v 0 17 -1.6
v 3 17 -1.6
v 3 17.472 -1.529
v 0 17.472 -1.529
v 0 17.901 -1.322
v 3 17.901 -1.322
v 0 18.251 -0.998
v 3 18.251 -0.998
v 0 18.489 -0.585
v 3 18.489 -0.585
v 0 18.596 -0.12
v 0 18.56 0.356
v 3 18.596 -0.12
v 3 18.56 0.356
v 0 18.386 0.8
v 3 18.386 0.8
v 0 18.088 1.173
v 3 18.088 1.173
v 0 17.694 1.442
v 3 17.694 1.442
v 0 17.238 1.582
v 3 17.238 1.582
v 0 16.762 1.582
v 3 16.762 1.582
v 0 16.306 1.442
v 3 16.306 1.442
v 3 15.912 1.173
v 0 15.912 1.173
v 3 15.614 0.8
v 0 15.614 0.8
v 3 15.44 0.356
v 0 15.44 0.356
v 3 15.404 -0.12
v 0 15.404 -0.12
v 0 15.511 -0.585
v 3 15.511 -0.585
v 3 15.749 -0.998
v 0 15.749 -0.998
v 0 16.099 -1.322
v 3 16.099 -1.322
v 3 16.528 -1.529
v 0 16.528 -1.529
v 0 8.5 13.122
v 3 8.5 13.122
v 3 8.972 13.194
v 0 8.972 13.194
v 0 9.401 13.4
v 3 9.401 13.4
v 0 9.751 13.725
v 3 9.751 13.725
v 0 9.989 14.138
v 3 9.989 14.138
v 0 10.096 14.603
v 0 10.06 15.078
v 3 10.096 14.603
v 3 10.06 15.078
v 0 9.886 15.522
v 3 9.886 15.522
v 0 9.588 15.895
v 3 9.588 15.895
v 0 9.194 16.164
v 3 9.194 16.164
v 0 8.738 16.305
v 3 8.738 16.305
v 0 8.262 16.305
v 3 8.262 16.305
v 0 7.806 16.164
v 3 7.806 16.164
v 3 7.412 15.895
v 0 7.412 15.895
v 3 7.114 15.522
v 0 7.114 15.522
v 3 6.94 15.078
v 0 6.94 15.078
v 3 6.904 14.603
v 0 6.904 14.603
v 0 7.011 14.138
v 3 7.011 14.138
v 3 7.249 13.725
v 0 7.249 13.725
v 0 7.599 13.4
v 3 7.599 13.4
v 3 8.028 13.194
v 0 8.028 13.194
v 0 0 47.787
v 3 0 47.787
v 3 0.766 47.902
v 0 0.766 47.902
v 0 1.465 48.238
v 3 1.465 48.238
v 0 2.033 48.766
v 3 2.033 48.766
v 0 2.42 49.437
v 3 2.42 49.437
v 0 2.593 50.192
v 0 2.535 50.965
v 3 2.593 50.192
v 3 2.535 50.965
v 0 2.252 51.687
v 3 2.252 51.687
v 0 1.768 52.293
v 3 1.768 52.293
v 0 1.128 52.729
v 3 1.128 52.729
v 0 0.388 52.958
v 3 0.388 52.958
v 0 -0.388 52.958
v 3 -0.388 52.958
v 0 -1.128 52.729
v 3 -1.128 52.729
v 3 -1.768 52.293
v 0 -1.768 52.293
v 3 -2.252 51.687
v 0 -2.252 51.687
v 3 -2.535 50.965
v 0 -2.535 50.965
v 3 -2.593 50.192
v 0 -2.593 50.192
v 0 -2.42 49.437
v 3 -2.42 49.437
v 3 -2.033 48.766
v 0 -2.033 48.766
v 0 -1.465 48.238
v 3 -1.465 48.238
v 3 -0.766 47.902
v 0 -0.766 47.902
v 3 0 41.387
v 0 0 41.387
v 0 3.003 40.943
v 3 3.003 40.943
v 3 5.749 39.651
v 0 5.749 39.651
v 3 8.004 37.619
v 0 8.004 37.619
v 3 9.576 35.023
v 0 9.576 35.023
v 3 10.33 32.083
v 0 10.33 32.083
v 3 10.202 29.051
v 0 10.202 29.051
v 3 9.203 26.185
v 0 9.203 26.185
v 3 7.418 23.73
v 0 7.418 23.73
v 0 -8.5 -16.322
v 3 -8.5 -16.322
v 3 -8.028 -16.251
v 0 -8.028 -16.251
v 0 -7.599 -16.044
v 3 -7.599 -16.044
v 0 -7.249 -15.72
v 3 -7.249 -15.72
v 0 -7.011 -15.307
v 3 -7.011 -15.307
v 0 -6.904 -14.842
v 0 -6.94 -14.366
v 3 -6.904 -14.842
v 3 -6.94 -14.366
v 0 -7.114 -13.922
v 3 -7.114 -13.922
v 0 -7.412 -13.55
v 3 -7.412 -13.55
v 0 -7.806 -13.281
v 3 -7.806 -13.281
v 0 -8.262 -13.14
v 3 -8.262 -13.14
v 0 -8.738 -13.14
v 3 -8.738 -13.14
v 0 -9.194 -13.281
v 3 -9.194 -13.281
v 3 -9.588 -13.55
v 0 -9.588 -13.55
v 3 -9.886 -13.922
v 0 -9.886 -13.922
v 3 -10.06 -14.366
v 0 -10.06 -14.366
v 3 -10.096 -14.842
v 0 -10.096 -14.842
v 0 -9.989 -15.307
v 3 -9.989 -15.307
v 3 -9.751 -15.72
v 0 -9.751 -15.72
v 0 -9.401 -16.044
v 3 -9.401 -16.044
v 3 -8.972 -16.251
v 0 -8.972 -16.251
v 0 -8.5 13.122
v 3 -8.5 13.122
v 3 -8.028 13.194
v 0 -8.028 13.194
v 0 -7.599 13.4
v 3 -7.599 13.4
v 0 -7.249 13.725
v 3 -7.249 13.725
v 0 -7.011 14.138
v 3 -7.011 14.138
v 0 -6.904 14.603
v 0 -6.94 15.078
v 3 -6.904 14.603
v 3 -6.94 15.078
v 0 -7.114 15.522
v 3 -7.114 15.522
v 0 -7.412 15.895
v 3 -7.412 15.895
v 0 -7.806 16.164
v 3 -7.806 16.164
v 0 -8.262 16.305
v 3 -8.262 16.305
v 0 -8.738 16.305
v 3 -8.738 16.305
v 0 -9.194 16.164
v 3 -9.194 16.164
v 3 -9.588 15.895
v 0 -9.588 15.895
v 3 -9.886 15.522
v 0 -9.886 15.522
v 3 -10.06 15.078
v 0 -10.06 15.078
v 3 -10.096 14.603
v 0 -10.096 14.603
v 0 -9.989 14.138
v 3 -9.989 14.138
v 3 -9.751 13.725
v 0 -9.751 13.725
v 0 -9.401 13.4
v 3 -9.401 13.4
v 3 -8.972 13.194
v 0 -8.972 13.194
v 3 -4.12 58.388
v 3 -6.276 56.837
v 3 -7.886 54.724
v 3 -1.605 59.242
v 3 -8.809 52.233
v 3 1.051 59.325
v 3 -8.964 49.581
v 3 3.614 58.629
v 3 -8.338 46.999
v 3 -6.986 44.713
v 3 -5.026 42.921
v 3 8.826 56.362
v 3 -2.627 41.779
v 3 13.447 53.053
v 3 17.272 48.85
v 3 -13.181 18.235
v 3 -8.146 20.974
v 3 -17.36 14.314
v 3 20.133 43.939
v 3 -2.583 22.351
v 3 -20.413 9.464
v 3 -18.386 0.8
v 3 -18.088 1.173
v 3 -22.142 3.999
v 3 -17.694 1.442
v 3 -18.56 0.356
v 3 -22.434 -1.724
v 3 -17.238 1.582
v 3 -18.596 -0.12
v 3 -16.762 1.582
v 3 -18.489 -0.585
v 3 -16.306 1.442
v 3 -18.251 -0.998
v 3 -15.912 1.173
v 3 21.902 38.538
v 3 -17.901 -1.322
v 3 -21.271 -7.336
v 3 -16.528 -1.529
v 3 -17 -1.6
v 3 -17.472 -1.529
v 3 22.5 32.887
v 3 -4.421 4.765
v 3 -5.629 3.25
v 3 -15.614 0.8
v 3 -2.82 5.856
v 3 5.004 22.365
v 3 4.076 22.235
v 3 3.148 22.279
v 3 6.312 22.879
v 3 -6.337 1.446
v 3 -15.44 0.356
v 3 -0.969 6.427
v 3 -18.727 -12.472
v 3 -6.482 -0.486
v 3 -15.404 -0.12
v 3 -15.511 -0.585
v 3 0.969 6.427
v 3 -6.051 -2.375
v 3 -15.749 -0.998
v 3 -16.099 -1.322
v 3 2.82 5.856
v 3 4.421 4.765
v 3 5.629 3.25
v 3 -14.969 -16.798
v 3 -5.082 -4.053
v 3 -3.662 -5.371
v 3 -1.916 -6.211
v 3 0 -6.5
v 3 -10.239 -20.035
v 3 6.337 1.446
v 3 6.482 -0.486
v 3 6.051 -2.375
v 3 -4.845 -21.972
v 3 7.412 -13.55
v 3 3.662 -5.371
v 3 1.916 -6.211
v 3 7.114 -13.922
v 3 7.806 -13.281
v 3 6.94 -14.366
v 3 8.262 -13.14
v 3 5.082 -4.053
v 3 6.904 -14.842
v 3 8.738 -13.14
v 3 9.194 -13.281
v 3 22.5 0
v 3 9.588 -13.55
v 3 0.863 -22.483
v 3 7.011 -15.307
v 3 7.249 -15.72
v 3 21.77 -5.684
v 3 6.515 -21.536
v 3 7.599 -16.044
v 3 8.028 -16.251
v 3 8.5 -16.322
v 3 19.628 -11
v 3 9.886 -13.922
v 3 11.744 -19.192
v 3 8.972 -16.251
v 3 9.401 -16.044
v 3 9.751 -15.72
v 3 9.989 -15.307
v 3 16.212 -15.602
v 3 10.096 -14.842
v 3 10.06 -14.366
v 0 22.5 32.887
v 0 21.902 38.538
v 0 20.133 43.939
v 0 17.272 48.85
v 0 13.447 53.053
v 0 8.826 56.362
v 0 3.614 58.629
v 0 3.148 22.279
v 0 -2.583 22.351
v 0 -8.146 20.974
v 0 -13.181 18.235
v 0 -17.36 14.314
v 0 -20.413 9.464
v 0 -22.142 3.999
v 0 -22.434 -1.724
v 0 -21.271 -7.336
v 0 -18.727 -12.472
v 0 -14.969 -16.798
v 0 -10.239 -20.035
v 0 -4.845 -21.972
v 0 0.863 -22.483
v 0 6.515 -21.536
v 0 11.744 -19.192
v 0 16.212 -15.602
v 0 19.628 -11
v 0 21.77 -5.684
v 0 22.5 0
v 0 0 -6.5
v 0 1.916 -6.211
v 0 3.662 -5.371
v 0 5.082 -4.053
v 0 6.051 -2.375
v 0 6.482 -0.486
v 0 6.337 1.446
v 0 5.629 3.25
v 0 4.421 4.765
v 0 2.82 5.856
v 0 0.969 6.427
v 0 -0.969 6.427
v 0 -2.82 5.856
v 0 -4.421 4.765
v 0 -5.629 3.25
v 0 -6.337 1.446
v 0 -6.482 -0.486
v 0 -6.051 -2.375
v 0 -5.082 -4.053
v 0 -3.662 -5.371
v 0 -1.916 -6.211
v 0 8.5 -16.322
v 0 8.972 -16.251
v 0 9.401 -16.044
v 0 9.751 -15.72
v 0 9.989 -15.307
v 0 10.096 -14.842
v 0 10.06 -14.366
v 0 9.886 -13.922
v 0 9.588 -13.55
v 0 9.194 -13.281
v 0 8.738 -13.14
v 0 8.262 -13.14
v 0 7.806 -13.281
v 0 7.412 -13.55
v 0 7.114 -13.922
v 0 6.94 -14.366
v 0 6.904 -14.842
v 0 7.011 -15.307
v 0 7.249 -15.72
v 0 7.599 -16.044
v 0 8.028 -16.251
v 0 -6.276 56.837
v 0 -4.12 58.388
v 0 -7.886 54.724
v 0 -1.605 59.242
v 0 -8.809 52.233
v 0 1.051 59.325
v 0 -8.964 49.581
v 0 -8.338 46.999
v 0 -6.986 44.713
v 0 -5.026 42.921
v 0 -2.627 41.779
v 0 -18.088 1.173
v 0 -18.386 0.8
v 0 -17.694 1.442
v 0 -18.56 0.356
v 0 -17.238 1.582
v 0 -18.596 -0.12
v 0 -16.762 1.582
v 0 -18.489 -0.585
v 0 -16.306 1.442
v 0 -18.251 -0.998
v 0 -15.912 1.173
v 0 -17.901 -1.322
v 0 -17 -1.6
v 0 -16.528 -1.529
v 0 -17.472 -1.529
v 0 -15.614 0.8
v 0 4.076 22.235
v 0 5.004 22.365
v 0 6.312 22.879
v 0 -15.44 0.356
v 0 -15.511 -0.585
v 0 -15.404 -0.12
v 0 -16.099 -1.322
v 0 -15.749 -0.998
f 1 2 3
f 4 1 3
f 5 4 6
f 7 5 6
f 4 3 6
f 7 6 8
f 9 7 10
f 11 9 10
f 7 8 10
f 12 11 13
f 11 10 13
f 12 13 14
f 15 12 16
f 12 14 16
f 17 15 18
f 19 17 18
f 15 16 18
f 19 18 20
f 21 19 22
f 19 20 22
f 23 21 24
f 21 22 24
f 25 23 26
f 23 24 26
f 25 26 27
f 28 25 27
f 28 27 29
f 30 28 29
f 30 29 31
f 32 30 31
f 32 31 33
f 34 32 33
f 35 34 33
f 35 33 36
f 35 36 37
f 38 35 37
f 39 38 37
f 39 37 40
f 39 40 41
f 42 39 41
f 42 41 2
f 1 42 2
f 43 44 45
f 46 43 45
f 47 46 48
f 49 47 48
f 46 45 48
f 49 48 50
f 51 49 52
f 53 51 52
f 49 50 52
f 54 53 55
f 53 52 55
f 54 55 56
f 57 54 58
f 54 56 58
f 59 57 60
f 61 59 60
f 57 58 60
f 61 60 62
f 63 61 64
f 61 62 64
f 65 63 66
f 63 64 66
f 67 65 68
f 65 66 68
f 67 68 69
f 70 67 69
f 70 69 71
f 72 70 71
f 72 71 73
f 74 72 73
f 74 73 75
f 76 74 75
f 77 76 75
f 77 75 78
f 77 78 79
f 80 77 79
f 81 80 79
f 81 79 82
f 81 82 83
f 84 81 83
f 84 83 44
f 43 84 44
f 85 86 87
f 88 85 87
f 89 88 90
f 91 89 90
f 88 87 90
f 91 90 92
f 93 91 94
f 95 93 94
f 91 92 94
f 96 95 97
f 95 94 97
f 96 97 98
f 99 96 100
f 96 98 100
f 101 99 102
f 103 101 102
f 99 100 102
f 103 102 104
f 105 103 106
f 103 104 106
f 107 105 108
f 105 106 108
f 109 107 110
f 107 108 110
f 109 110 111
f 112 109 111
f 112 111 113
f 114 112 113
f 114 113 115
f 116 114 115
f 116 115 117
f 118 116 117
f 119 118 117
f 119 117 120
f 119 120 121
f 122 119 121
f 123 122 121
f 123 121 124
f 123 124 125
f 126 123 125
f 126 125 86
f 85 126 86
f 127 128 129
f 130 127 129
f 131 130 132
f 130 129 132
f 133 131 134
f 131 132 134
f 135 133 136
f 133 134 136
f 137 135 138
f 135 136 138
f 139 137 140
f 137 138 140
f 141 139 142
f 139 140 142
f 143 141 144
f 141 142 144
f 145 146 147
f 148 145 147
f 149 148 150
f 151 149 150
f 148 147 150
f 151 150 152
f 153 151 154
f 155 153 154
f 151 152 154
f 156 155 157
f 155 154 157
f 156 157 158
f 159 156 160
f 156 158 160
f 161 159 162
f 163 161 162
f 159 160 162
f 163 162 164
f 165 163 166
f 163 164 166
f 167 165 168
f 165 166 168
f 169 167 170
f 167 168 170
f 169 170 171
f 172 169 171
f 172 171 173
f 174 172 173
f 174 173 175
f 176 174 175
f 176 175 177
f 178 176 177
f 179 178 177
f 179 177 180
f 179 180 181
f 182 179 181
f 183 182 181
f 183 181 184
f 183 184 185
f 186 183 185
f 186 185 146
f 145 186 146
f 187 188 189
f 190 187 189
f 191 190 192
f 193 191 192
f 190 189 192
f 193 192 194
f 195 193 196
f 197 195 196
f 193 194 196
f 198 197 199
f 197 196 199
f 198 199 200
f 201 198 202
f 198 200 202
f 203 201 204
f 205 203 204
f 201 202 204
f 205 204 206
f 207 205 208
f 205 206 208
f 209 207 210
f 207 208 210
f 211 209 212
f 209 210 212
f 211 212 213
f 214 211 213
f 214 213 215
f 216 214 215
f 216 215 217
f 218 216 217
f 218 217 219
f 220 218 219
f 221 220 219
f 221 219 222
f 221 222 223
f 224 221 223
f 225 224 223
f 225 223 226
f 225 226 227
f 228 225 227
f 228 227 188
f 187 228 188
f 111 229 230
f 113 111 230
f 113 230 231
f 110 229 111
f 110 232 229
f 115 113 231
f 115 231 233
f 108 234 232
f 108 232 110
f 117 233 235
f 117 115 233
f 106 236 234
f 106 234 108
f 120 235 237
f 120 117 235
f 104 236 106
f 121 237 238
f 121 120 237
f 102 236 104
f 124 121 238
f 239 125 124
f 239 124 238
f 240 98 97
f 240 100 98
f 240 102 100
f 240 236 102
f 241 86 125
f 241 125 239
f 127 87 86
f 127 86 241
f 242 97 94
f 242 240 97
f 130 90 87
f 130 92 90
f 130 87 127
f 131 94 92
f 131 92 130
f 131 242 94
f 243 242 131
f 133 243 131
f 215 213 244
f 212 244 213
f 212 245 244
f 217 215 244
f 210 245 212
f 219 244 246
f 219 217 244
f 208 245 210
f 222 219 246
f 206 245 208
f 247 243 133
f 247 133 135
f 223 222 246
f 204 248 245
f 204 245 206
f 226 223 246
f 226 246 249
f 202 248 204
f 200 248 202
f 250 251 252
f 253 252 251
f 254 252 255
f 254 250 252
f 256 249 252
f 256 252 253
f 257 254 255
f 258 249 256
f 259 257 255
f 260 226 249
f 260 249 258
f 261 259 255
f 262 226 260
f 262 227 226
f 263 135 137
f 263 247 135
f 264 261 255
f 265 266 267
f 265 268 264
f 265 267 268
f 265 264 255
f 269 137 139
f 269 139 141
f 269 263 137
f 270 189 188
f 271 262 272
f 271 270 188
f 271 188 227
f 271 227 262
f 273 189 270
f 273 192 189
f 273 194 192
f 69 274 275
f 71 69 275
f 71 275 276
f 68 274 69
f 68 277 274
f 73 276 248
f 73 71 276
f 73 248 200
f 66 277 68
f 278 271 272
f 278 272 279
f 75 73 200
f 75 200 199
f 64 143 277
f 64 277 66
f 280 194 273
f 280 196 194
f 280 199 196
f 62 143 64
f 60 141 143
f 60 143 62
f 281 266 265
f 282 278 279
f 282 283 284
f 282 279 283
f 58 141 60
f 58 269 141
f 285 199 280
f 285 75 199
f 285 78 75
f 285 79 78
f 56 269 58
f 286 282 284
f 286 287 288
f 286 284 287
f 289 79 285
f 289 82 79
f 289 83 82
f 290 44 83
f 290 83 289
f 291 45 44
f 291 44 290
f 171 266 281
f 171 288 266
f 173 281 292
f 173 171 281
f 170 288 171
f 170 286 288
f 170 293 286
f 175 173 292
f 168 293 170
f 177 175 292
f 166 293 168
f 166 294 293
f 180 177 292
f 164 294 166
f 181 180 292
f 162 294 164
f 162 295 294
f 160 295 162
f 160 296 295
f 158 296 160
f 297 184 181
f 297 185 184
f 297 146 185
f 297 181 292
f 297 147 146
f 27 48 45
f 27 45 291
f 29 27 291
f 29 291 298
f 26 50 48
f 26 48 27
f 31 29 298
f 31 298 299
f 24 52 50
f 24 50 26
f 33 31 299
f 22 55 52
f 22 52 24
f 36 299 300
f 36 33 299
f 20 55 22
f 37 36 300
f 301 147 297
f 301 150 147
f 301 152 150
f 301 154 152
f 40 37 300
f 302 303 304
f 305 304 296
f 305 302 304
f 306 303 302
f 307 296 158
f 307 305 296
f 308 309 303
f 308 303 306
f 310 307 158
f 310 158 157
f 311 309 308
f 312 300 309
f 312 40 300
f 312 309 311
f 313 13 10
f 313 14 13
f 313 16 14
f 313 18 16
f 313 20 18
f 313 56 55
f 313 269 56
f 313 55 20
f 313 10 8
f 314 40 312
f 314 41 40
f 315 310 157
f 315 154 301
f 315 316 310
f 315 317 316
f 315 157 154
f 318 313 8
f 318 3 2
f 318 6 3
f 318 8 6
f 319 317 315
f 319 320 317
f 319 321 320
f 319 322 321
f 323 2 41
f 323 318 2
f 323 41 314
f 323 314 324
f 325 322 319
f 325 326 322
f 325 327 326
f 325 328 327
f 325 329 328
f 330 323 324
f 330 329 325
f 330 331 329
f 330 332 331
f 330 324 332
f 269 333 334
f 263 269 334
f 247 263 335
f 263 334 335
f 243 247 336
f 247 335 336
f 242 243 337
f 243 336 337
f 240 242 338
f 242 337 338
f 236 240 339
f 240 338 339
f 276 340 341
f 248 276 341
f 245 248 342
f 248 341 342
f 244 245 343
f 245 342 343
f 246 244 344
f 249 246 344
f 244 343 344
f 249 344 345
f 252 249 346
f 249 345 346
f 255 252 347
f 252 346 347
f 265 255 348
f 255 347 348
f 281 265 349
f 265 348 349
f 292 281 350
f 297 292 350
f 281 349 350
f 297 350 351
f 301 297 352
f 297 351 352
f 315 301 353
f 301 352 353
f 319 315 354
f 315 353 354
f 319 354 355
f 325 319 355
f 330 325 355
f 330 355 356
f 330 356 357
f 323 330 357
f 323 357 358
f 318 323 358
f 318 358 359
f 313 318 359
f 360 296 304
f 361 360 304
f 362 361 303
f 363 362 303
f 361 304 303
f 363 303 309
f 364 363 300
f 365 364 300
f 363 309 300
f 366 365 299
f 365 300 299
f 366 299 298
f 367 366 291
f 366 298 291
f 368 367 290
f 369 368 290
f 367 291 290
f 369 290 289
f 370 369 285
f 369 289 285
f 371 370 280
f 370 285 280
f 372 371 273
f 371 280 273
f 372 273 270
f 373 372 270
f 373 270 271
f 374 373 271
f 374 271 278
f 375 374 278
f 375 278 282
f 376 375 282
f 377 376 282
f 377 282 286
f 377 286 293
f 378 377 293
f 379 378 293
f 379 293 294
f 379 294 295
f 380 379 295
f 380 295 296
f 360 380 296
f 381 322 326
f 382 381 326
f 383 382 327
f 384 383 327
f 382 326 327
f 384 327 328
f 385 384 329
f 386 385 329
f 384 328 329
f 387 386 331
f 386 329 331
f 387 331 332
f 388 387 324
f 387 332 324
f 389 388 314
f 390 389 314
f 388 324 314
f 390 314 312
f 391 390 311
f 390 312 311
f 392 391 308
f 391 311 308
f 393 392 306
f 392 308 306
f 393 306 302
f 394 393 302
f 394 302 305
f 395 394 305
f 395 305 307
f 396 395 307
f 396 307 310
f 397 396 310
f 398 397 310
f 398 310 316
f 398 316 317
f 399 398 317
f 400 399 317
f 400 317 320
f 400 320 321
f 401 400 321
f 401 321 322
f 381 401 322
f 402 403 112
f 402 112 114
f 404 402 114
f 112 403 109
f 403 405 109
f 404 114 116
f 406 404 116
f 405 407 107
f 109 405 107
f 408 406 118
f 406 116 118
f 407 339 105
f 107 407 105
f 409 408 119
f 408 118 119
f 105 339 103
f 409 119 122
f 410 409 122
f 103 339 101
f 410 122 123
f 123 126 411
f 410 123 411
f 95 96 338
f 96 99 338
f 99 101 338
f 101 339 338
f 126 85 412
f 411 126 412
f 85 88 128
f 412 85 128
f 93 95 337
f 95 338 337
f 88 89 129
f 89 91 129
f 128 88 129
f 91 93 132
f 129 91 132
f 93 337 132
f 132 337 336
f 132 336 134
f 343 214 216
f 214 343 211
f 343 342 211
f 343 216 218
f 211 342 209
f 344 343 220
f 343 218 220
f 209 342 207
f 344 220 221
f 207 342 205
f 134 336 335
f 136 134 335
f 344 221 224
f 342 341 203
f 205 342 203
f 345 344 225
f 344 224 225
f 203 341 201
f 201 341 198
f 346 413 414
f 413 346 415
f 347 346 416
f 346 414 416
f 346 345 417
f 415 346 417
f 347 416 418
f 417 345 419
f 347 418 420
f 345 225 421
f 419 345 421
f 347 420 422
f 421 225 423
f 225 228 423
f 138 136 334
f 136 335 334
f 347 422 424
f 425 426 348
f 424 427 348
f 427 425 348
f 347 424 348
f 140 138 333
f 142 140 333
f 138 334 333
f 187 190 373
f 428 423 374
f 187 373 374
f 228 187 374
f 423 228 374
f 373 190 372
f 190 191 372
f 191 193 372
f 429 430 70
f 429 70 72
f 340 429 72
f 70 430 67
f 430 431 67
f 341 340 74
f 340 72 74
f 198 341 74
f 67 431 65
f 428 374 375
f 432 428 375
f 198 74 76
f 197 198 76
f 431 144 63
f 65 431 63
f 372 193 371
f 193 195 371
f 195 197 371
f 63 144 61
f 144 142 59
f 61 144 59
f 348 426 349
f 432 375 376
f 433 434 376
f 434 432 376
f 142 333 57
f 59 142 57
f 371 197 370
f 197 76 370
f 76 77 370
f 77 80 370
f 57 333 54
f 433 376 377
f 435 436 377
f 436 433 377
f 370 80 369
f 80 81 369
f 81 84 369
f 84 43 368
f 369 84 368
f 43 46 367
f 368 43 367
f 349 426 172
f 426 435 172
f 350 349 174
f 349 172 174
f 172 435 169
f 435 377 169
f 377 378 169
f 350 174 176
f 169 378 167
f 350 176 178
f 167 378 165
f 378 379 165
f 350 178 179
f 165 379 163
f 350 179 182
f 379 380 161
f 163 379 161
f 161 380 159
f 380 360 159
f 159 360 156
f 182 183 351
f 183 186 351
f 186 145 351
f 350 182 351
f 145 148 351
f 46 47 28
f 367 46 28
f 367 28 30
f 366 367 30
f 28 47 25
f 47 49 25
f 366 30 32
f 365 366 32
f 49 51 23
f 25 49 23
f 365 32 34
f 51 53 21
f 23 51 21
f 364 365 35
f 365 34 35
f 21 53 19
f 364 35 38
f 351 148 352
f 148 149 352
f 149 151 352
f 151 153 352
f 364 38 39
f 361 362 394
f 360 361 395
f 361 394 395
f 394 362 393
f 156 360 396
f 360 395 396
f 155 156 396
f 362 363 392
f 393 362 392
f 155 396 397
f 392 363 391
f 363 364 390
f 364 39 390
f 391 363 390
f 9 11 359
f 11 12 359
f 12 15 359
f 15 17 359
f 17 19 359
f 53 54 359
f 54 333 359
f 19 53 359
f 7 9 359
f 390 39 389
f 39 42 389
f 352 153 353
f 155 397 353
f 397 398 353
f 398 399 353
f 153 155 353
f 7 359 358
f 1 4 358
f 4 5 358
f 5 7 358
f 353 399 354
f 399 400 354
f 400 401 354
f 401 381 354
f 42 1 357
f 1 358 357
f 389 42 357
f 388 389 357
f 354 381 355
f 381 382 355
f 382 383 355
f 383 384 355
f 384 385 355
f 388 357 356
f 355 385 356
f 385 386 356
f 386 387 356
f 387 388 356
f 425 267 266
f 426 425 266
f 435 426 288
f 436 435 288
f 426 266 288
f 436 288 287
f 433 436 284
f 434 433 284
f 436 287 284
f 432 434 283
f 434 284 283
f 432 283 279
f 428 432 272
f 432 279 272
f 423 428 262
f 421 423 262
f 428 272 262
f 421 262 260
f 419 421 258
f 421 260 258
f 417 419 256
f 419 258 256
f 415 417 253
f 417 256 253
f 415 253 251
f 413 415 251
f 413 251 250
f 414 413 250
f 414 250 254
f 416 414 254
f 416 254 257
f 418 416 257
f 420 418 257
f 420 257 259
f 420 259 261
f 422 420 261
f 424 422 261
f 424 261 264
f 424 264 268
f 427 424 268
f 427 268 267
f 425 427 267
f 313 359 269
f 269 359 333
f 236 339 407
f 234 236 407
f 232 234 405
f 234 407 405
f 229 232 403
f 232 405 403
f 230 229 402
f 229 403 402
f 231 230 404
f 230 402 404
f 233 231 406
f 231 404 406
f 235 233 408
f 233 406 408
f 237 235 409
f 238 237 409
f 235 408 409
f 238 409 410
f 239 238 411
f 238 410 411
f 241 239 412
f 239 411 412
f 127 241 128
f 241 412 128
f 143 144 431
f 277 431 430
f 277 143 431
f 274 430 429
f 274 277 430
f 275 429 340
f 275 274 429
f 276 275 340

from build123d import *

# Parameters (mm, degrees)
BOSS_EXTRUDE1_DEPTH = 3
FILLET2_R           = 5
SKETCH2_R           = 6.5
SKETCH2_R_2         = 2.6
SKETCH2_R_3         = 1.6
CUT_EXTRUDE1_DEPTH  = 4.0000001


with BuildPart() as part:
    # Sketch1 → Boss-Extrude1 (new body)
    with BuildSketch(Plane(origin=(0, 0, 0), x_dir=(0, 0, -1), z_dir=(1, 0, 0))):
        with BuildLine():
            ThreePointArc((-41.386624325, 0), (-33.610207892, 10.053296954), (-21.925290889, 5.052882289))
            ThreePointArc((-21.925290889, 5.052882289), (14.009999081, -17.60596279), (0, 22.5))
            Line((0, 22.5), (-32.886624325, 22.5))
            ThreePointArc((-32.886624325, 22.5), (-48.850275915, 17.272163951), (-58.62909831, 3.614086692))
            ThreePointArc((-58.62909831, 3.614086692), (-52.232936073, -8.808582913), (-41.386624325, 0))
        make_face()
    extrude(amount=BOSS_EXTRUDE1_DEPTH)

    # Fillet2
    fillet2_edges = [part.edges().sort_by_distance(p)[0] for p in [
        (1.5, 5.052882289, 21.925290889),
    ]]
    fillet(fillet2_edges, radius=FILLET2_R)

    # Sketch2 → Cut-Extrude1 (cut, through all)
    with BuildSketch(Plane(origin=(3, 0, 0), x_dir=(0, 0, -1), z_dir=(1, 0, 0))):
        Circle(SKETCH2_R)
        with Locations((-50.386624325, 0)):
            Circle(SKETCH2_R_2)
        with Locations((0, 17)):
            Circle(SKETCH2_R_3)
        with Locations((14.722431864, 8.5)):
            Circle(SKETCH2_R_3)
        with Locations((14.722431864, -8.5)):
            Circle(SKETCH2_R_3)
        with Locations((0, -17)):
            Circle(SKETCH2_R_3)
        with Locations((-14.722431864, -8.5)):
            Circle(SKETCH2_R_3)
        with Locations((-14.722431864, 8.5)):
            Circle(SKETCH2_R_3)
    extrude(amount=-CUT_EXTRUDE1_DEPTH, mode=Mode.SUBTRACT)


solid = part.part
